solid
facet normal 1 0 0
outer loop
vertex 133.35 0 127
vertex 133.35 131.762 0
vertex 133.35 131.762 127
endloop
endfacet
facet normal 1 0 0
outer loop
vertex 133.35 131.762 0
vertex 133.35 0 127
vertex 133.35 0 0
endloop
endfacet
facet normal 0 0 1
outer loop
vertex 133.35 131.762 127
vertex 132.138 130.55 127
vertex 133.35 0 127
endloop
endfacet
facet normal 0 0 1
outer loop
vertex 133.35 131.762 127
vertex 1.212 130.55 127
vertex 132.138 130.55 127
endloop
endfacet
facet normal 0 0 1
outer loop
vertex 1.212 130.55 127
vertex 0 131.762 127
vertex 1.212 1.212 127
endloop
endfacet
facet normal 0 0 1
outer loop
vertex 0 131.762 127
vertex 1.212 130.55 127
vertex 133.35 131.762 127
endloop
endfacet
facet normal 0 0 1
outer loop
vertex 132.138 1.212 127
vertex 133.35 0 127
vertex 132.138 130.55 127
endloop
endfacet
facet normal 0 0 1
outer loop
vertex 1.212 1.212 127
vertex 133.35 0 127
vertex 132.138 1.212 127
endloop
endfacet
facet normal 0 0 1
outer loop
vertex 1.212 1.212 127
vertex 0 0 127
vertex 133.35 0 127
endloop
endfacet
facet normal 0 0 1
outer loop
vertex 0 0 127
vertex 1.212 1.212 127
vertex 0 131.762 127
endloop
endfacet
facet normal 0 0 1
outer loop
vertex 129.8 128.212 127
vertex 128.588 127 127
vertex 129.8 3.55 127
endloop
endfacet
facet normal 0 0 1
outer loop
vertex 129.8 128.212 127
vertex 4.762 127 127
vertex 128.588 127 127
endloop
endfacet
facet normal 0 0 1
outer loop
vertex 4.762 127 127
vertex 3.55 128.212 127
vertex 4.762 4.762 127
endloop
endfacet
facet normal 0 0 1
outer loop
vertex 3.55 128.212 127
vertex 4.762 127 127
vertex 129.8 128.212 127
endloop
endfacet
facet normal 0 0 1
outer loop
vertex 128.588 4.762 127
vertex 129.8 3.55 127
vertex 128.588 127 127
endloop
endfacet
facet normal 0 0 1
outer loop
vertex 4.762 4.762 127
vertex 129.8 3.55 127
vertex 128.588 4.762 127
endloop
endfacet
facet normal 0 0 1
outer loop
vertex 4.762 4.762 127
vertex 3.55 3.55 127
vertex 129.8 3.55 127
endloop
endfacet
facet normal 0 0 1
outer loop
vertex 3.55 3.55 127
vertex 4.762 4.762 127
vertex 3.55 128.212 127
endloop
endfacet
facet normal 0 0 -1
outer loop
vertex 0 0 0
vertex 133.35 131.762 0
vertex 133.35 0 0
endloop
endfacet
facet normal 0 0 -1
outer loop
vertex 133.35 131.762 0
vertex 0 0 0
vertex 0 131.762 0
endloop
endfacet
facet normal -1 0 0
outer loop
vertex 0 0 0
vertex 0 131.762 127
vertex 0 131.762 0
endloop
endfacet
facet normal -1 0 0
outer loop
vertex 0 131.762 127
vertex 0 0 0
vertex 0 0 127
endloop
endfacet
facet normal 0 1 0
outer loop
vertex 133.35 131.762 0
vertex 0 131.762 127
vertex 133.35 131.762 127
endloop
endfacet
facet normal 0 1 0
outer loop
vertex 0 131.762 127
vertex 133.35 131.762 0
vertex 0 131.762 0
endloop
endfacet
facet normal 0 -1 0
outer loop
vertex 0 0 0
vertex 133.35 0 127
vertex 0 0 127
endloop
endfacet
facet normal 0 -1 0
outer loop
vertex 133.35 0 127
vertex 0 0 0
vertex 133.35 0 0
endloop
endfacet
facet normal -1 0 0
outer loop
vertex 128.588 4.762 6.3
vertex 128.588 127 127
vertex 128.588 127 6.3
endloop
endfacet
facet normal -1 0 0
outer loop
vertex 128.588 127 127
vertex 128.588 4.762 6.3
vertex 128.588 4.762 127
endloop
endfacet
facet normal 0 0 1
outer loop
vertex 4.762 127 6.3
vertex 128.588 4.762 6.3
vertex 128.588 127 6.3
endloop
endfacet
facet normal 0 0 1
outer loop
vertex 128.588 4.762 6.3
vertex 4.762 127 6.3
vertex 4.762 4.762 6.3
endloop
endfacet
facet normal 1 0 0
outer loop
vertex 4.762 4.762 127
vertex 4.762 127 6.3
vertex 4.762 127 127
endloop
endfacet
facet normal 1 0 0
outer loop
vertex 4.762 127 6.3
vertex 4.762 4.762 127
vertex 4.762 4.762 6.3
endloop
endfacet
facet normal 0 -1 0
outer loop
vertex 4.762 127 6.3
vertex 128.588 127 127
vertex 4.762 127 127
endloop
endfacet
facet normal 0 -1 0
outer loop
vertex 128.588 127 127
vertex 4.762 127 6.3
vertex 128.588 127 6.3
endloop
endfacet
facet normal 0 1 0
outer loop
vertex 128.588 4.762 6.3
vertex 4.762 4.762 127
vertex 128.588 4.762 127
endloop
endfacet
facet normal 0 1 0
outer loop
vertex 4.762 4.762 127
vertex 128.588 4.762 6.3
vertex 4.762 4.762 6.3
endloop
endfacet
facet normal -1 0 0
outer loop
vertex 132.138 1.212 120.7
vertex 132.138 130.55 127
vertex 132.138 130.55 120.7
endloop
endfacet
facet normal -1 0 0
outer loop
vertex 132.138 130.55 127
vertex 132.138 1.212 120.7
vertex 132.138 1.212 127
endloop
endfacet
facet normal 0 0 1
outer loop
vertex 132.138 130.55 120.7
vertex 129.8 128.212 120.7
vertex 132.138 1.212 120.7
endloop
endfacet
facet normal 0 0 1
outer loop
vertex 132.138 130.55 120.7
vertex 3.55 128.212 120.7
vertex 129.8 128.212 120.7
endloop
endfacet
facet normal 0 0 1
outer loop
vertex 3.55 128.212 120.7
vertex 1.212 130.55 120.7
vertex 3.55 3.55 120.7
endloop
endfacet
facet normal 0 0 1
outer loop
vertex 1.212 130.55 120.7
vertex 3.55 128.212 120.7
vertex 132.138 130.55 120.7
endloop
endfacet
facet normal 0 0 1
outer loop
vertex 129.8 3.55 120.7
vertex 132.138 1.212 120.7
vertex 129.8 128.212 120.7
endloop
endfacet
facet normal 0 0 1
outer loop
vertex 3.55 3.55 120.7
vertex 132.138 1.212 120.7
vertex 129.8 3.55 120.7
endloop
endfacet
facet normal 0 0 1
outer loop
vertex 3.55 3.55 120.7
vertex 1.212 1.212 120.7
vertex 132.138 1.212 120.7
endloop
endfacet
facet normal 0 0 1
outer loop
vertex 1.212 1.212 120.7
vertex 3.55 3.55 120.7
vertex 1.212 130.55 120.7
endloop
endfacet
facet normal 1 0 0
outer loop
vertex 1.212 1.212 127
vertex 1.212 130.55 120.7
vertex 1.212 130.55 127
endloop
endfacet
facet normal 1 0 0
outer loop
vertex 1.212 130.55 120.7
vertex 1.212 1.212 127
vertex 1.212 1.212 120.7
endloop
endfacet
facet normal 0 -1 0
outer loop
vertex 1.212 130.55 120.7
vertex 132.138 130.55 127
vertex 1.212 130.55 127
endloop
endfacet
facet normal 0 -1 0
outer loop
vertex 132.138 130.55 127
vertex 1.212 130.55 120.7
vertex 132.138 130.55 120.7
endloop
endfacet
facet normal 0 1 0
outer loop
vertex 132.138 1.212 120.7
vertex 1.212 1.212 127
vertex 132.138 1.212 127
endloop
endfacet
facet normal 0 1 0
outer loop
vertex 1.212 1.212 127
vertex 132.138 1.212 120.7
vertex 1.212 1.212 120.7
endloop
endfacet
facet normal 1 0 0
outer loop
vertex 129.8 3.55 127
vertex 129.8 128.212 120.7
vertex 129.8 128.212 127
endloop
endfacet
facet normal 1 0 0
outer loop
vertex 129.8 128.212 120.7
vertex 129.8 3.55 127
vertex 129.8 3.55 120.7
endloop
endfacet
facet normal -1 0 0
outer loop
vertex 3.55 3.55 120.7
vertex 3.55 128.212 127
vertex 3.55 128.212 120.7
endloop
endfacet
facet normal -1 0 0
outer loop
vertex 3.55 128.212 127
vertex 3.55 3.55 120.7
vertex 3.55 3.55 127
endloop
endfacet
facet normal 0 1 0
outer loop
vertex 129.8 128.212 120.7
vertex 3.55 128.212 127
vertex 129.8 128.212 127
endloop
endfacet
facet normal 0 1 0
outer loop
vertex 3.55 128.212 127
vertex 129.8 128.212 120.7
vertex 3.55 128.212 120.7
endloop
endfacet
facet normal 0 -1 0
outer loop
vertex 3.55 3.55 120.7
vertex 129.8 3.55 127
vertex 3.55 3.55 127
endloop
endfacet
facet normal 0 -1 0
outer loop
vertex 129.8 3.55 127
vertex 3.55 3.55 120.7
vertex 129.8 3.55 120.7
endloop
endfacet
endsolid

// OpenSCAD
/* [Model Resolution (All dimensions are in Millimeters)] */
$fn = 256;

/* [Box Container Properties] */
Length = 133.35;
Width = 131.762;
Fit = 0; //.889(.035") is a good fit for most 
Height = 127;  //241.3
Wall_Thickness = 4.762; // 4.762
Floor_Thickness = 6.3;

Groove_Width = 2.338; // 2.338
Groove_Depth = 6.3;

difference(){
Outside_Box();
Groove_Box();
};

module Outside_Box(){
  difference()
{   
    // Outside Dimensions
    cube([ 
        Length, 
        Width, 
        Height ],
         center = false);
    // Inside Dimensions
    translate([ 
        Wall_Thickness, 
        Wall_Thickness, 
        Floor_Thickness
    ])
        cube([ 
          Length-Wall_Thickness*2, 
          Width-Wall_Thickness*2, 
          Height], 
          center = false);
    
};
}

module Groove_Box(){
    
    // Center groove in the wall
    wall_center = Wall_Thickness/2-Groove_Width/2;
 
// Groove Square
// Outside Dimensions
color("red"){
translate([
    wall_center,
    wall_center,
    Height-Groove_Depth,
    ]) {   
difference(){
cube([ 
        Length-wall_center*2, 
        Width-wall_center*2,  
        Groove_Depth+1 
    ],
         center = false
);
//Inside Dimensions
translate([
Groove_Width,
Groove_Width,
-1,
])
cube([
 Length-Groove_Width*2-wall_center*2, 
 Width-Groove_Width*2-wall_center*2, 
Groove_Depth+3
],
center = false
); 
    
};
 };  
}; 
}
